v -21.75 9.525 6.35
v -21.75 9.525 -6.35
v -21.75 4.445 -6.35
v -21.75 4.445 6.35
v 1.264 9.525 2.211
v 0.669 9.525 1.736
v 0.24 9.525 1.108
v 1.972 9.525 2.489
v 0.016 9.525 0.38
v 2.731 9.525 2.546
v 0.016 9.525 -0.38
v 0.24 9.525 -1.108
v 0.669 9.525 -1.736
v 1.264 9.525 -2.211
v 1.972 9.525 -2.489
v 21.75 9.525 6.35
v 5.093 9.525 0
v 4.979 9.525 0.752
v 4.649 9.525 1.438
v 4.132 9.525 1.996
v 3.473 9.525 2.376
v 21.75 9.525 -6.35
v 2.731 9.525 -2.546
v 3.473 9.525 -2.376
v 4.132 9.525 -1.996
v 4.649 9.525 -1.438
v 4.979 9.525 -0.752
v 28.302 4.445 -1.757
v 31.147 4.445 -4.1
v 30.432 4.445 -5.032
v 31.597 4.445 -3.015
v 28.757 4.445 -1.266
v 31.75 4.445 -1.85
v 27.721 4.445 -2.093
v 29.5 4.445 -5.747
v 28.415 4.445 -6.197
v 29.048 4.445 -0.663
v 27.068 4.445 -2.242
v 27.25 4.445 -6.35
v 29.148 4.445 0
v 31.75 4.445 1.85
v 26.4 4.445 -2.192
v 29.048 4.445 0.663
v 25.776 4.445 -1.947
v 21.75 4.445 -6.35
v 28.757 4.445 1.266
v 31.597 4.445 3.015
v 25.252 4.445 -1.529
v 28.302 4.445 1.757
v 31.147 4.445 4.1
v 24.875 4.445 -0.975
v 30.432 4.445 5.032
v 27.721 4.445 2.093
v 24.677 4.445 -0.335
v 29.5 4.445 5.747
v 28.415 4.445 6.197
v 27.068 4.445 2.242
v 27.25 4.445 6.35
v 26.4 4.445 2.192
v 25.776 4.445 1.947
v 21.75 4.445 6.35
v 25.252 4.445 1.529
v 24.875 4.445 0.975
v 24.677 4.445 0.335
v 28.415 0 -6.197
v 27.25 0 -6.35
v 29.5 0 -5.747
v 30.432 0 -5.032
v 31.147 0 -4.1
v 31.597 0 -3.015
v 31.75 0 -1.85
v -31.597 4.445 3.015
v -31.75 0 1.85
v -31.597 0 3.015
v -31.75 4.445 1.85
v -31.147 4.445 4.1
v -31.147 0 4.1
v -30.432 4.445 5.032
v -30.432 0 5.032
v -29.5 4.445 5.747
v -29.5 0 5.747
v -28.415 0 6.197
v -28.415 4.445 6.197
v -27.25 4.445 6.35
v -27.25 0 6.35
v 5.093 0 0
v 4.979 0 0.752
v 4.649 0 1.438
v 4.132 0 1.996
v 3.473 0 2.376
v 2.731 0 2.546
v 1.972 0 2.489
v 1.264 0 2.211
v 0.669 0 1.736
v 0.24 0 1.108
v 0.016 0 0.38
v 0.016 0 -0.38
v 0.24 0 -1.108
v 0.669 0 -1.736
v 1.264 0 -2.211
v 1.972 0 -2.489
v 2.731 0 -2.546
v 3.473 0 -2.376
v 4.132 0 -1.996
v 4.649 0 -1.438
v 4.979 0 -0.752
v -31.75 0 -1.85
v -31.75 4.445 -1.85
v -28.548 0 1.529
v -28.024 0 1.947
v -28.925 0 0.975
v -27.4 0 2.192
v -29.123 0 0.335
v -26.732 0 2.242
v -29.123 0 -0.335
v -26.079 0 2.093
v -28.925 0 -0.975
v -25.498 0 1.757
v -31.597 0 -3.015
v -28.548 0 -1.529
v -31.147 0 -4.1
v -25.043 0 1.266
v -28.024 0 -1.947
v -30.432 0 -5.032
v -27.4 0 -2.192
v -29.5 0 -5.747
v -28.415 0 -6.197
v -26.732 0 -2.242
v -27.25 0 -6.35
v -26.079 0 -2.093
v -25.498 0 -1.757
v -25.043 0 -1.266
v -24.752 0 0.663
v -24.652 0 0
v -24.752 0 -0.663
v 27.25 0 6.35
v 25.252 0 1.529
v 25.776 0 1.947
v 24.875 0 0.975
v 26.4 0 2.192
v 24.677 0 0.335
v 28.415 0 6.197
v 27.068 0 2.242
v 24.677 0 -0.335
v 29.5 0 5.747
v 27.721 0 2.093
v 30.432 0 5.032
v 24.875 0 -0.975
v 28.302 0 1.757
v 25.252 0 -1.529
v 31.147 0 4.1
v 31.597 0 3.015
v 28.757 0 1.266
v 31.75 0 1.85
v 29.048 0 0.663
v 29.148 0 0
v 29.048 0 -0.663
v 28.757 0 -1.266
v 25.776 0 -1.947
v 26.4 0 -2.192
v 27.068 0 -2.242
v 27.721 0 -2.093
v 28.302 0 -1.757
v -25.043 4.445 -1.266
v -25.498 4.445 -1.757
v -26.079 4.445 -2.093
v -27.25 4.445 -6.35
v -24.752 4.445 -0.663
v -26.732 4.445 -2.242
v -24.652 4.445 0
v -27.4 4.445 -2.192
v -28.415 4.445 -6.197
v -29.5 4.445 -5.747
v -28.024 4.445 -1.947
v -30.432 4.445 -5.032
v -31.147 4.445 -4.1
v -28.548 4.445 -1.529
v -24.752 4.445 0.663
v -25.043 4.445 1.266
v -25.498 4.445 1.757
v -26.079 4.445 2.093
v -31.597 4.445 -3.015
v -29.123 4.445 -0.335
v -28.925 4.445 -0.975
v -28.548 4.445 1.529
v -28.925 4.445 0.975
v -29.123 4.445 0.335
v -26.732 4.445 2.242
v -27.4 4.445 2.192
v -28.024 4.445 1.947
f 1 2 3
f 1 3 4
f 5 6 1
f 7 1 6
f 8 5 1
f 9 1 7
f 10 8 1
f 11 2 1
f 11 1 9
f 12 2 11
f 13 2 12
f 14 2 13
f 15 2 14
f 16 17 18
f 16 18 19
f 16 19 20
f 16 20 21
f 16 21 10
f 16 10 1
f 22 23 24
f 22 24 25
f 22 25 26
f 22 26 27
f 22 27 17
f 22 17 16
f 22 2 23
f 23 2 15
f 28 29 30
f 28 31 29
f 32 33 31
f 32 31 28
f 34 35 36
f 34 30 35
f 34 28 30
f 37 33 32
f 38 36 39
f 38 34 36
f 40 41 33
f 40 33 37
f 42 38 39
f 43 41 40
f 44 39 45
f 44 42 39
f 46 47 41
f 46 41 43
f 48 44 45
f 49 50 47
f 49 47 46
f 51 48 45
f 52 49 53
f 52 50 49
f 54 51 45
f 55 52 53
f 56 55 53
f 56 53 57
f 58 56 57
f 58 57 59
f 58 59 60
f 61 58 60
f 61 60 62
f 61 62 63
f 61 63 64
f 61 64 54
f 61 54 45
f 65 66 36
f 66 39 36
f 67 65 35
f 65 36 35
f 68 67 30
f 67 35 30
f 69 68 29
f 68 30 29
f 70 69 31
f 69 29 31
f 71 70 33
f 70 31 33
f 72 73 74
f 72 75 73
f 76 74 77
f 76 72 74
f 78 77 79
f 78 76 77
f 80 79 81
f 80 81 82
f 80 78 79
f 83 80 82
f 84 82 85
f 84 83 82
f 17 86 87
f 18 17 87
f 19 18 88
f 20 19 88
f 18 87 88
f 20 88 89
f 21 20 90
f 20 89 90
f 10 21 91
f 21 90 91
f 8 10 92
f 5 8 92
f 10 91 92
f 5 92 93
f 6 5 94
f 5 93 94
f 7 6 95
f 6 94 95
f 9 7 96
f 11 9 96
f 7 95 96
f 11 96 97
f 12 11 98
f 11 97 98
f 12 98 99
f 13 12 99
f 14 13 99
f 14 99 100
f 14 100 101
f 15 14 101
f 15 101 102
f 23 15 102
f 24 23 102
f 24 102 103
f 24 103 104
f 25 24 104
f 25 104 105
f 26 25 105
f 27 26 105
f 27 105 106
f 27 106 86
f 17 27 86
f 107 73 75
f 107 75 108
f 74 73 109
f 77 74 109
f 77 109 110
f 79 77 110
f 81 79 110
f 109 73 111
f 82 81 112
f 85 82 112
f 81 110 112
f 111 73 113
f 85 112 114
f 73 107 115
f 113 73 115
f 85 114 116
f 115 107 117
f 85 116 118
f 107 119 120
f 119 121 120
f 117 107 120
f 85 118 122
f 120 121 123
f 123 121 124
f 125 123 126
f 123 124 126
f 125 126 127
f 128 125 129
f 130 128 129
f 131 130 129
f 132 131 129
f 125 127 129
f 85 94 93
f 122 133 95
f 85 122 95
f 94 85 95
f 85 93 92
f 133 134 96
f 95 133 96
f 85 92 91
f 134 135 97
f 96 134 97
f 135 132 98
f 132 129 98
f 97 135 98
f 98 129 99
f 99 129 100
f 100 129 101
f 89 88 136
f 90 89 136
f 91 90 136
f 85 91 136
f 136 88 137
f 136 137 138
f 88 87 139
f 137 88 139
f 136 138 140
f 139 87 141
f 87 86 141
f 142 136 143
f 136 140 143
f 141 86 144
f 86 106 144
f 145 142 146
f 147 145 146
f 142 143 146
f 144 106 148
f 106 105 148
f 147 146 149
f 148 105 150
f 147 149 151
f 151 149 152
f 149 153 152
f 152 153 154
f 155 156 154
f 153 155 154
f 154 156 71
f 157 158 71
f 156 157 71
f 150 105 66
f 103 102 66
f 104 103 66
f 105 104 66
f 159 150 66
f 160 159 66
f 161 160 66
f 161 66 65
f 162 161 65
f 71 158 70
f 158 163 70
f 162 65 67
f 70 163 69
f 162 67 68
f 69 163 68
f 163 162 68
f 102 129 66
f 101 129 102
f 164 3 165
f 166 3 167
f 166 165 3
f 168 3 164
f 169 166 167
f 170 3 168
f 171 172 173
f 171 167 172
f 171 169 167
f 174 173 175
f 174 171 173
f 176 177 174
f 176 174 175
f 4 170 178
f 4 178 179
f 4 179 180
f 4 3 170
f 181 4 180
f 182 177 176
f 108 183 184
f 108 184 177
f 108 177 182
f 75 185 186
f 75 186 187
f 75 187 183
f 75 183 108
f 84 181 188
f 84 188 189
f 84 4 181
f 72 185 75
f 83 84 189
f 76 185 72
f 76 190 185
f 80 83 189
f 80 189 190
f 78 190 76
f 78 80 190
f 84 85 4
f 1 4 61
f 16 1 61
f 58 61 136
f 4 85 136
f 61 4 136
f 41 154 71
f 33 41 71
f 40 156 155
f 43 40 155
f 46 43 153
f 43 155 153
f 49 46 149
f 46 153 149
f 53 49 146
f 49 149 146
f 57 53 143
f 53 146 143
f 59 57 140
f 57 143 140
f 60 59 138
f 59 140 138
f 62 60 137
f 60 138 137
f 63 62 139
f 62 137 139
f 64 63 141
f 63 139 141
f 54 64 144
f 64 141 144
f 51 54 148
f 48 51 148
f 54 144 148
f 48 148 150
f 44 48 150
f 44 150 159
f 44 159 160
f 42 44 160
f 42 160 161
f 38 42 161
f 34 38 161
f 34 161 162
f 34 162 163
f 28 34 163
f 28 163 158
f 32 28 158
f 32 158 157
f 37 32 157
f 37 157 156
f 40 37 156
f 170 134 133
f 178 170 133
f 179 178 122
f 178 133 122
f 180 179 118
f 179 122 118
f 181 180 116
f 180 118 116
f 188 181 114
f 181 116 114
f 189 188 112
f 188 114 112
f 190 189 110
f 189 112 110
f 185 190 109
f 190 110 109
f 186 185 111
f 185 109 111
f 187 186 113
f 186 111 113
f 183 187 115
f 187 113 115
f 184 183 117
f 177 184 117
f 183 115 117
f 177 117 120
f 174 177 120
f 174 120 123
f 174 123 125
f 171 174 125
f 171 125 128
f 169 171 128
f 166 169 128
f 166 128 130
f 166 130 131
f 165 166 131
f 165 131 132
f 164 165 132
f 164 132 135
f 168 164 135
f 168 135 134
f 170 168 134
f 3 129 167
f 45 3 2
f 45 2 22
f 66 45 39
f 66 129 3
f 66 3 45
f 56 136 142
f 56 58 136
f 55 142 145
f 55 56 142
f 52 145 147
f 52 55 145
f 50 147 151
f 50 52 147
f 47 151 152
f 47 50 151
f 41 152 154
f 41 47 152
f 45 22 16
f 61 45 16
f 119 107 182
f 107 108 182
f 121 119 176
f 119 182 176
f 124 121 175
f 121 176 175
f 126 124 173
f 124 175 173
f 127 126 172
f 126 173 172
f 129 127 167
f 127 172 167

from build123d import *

# Parameters (mm, degrees)
SKETCH1_W               = 63.5
SKETCH1_H               = 12.7
EXTRUDE1_DEPTH          = 9.525
F_1_4_20_TAPPED_HOLE1_D = 5.1054
F_8_CLEARANCE_HOLE1_D   = 4.4958
SKETCH6_W               = 10
SKETCH6_H               = 12.7
CUT_EXTRUDE1_DEPTH      = 5.08
FILLET1_R               = 4.5


with BuildPart() as part:
    # Sketch1 → Extrude1 (new body)
    with BuildSketch(Plane(origin=(0, 0, 0), x_dir=(1, 0, 0), z_dir=(0, 1, 0))):
        Rectangle(SKETCH1_W, SKETCH1_H)
    extrude(amount=EXTRUDE1_DEPTH)

    # 1/4-20 Tapped Hole1 (through all)
    with Locations(Plane(origin=(-30.881531845, 9.525, 2.131635314), x_dir=(-1, 0, 0), z_dir=(0, 1, 0))):
        with Locations((-33.421531845, -2.131635314)):
            Hole(F_1_4_20_TAPPED_HOLE1_D / 2)

    # #8 Clearance Hole1 (through all)
    with Locations(Plane(origin=(34.21817196, 9.525, -1.204904774), x_dir=(-1, 0, 0), z_dir=(0, 1, 0))):
        with Locations((61.11817196, 1.204904774), (7.31817196, 1.204904774)):
            Hole(F_8_CLEARANCE_HOLE1_D / 2)

    # Sketch6 → Cut-Extrude1 (cut)
    with BuildSketch(Plane(origin=(0, 9.525, 0), x_dir=(-1, 0, 0), z_dir=(0, 1, 0))):
        with Locations((26.75, 0)):
            Rectangle(SKETCH6_W, SKETCH6_H)
        with Locations((-26.75, 0)):
            Rectangle(SKETCH6_W, SKETCH6_H)
    extrude(amount=-CUT_EXTRUDE1_DEPTH, mode=Mode.SUBTRACT)

    # Fillet1
    fillet1_edges = [part.edges().sort_by_distance(p)[0] for p in [
        (-31.75, 2.2225, -6.35),
        (-31.75, 2.2225, 6.35),
        (31.75, 2.2225, -6.35),
        (31.75, 2.2225, 6.35),
    ]]
    fillet(fillet1_edges, radius=FILLET1_R)


solid = part.part
